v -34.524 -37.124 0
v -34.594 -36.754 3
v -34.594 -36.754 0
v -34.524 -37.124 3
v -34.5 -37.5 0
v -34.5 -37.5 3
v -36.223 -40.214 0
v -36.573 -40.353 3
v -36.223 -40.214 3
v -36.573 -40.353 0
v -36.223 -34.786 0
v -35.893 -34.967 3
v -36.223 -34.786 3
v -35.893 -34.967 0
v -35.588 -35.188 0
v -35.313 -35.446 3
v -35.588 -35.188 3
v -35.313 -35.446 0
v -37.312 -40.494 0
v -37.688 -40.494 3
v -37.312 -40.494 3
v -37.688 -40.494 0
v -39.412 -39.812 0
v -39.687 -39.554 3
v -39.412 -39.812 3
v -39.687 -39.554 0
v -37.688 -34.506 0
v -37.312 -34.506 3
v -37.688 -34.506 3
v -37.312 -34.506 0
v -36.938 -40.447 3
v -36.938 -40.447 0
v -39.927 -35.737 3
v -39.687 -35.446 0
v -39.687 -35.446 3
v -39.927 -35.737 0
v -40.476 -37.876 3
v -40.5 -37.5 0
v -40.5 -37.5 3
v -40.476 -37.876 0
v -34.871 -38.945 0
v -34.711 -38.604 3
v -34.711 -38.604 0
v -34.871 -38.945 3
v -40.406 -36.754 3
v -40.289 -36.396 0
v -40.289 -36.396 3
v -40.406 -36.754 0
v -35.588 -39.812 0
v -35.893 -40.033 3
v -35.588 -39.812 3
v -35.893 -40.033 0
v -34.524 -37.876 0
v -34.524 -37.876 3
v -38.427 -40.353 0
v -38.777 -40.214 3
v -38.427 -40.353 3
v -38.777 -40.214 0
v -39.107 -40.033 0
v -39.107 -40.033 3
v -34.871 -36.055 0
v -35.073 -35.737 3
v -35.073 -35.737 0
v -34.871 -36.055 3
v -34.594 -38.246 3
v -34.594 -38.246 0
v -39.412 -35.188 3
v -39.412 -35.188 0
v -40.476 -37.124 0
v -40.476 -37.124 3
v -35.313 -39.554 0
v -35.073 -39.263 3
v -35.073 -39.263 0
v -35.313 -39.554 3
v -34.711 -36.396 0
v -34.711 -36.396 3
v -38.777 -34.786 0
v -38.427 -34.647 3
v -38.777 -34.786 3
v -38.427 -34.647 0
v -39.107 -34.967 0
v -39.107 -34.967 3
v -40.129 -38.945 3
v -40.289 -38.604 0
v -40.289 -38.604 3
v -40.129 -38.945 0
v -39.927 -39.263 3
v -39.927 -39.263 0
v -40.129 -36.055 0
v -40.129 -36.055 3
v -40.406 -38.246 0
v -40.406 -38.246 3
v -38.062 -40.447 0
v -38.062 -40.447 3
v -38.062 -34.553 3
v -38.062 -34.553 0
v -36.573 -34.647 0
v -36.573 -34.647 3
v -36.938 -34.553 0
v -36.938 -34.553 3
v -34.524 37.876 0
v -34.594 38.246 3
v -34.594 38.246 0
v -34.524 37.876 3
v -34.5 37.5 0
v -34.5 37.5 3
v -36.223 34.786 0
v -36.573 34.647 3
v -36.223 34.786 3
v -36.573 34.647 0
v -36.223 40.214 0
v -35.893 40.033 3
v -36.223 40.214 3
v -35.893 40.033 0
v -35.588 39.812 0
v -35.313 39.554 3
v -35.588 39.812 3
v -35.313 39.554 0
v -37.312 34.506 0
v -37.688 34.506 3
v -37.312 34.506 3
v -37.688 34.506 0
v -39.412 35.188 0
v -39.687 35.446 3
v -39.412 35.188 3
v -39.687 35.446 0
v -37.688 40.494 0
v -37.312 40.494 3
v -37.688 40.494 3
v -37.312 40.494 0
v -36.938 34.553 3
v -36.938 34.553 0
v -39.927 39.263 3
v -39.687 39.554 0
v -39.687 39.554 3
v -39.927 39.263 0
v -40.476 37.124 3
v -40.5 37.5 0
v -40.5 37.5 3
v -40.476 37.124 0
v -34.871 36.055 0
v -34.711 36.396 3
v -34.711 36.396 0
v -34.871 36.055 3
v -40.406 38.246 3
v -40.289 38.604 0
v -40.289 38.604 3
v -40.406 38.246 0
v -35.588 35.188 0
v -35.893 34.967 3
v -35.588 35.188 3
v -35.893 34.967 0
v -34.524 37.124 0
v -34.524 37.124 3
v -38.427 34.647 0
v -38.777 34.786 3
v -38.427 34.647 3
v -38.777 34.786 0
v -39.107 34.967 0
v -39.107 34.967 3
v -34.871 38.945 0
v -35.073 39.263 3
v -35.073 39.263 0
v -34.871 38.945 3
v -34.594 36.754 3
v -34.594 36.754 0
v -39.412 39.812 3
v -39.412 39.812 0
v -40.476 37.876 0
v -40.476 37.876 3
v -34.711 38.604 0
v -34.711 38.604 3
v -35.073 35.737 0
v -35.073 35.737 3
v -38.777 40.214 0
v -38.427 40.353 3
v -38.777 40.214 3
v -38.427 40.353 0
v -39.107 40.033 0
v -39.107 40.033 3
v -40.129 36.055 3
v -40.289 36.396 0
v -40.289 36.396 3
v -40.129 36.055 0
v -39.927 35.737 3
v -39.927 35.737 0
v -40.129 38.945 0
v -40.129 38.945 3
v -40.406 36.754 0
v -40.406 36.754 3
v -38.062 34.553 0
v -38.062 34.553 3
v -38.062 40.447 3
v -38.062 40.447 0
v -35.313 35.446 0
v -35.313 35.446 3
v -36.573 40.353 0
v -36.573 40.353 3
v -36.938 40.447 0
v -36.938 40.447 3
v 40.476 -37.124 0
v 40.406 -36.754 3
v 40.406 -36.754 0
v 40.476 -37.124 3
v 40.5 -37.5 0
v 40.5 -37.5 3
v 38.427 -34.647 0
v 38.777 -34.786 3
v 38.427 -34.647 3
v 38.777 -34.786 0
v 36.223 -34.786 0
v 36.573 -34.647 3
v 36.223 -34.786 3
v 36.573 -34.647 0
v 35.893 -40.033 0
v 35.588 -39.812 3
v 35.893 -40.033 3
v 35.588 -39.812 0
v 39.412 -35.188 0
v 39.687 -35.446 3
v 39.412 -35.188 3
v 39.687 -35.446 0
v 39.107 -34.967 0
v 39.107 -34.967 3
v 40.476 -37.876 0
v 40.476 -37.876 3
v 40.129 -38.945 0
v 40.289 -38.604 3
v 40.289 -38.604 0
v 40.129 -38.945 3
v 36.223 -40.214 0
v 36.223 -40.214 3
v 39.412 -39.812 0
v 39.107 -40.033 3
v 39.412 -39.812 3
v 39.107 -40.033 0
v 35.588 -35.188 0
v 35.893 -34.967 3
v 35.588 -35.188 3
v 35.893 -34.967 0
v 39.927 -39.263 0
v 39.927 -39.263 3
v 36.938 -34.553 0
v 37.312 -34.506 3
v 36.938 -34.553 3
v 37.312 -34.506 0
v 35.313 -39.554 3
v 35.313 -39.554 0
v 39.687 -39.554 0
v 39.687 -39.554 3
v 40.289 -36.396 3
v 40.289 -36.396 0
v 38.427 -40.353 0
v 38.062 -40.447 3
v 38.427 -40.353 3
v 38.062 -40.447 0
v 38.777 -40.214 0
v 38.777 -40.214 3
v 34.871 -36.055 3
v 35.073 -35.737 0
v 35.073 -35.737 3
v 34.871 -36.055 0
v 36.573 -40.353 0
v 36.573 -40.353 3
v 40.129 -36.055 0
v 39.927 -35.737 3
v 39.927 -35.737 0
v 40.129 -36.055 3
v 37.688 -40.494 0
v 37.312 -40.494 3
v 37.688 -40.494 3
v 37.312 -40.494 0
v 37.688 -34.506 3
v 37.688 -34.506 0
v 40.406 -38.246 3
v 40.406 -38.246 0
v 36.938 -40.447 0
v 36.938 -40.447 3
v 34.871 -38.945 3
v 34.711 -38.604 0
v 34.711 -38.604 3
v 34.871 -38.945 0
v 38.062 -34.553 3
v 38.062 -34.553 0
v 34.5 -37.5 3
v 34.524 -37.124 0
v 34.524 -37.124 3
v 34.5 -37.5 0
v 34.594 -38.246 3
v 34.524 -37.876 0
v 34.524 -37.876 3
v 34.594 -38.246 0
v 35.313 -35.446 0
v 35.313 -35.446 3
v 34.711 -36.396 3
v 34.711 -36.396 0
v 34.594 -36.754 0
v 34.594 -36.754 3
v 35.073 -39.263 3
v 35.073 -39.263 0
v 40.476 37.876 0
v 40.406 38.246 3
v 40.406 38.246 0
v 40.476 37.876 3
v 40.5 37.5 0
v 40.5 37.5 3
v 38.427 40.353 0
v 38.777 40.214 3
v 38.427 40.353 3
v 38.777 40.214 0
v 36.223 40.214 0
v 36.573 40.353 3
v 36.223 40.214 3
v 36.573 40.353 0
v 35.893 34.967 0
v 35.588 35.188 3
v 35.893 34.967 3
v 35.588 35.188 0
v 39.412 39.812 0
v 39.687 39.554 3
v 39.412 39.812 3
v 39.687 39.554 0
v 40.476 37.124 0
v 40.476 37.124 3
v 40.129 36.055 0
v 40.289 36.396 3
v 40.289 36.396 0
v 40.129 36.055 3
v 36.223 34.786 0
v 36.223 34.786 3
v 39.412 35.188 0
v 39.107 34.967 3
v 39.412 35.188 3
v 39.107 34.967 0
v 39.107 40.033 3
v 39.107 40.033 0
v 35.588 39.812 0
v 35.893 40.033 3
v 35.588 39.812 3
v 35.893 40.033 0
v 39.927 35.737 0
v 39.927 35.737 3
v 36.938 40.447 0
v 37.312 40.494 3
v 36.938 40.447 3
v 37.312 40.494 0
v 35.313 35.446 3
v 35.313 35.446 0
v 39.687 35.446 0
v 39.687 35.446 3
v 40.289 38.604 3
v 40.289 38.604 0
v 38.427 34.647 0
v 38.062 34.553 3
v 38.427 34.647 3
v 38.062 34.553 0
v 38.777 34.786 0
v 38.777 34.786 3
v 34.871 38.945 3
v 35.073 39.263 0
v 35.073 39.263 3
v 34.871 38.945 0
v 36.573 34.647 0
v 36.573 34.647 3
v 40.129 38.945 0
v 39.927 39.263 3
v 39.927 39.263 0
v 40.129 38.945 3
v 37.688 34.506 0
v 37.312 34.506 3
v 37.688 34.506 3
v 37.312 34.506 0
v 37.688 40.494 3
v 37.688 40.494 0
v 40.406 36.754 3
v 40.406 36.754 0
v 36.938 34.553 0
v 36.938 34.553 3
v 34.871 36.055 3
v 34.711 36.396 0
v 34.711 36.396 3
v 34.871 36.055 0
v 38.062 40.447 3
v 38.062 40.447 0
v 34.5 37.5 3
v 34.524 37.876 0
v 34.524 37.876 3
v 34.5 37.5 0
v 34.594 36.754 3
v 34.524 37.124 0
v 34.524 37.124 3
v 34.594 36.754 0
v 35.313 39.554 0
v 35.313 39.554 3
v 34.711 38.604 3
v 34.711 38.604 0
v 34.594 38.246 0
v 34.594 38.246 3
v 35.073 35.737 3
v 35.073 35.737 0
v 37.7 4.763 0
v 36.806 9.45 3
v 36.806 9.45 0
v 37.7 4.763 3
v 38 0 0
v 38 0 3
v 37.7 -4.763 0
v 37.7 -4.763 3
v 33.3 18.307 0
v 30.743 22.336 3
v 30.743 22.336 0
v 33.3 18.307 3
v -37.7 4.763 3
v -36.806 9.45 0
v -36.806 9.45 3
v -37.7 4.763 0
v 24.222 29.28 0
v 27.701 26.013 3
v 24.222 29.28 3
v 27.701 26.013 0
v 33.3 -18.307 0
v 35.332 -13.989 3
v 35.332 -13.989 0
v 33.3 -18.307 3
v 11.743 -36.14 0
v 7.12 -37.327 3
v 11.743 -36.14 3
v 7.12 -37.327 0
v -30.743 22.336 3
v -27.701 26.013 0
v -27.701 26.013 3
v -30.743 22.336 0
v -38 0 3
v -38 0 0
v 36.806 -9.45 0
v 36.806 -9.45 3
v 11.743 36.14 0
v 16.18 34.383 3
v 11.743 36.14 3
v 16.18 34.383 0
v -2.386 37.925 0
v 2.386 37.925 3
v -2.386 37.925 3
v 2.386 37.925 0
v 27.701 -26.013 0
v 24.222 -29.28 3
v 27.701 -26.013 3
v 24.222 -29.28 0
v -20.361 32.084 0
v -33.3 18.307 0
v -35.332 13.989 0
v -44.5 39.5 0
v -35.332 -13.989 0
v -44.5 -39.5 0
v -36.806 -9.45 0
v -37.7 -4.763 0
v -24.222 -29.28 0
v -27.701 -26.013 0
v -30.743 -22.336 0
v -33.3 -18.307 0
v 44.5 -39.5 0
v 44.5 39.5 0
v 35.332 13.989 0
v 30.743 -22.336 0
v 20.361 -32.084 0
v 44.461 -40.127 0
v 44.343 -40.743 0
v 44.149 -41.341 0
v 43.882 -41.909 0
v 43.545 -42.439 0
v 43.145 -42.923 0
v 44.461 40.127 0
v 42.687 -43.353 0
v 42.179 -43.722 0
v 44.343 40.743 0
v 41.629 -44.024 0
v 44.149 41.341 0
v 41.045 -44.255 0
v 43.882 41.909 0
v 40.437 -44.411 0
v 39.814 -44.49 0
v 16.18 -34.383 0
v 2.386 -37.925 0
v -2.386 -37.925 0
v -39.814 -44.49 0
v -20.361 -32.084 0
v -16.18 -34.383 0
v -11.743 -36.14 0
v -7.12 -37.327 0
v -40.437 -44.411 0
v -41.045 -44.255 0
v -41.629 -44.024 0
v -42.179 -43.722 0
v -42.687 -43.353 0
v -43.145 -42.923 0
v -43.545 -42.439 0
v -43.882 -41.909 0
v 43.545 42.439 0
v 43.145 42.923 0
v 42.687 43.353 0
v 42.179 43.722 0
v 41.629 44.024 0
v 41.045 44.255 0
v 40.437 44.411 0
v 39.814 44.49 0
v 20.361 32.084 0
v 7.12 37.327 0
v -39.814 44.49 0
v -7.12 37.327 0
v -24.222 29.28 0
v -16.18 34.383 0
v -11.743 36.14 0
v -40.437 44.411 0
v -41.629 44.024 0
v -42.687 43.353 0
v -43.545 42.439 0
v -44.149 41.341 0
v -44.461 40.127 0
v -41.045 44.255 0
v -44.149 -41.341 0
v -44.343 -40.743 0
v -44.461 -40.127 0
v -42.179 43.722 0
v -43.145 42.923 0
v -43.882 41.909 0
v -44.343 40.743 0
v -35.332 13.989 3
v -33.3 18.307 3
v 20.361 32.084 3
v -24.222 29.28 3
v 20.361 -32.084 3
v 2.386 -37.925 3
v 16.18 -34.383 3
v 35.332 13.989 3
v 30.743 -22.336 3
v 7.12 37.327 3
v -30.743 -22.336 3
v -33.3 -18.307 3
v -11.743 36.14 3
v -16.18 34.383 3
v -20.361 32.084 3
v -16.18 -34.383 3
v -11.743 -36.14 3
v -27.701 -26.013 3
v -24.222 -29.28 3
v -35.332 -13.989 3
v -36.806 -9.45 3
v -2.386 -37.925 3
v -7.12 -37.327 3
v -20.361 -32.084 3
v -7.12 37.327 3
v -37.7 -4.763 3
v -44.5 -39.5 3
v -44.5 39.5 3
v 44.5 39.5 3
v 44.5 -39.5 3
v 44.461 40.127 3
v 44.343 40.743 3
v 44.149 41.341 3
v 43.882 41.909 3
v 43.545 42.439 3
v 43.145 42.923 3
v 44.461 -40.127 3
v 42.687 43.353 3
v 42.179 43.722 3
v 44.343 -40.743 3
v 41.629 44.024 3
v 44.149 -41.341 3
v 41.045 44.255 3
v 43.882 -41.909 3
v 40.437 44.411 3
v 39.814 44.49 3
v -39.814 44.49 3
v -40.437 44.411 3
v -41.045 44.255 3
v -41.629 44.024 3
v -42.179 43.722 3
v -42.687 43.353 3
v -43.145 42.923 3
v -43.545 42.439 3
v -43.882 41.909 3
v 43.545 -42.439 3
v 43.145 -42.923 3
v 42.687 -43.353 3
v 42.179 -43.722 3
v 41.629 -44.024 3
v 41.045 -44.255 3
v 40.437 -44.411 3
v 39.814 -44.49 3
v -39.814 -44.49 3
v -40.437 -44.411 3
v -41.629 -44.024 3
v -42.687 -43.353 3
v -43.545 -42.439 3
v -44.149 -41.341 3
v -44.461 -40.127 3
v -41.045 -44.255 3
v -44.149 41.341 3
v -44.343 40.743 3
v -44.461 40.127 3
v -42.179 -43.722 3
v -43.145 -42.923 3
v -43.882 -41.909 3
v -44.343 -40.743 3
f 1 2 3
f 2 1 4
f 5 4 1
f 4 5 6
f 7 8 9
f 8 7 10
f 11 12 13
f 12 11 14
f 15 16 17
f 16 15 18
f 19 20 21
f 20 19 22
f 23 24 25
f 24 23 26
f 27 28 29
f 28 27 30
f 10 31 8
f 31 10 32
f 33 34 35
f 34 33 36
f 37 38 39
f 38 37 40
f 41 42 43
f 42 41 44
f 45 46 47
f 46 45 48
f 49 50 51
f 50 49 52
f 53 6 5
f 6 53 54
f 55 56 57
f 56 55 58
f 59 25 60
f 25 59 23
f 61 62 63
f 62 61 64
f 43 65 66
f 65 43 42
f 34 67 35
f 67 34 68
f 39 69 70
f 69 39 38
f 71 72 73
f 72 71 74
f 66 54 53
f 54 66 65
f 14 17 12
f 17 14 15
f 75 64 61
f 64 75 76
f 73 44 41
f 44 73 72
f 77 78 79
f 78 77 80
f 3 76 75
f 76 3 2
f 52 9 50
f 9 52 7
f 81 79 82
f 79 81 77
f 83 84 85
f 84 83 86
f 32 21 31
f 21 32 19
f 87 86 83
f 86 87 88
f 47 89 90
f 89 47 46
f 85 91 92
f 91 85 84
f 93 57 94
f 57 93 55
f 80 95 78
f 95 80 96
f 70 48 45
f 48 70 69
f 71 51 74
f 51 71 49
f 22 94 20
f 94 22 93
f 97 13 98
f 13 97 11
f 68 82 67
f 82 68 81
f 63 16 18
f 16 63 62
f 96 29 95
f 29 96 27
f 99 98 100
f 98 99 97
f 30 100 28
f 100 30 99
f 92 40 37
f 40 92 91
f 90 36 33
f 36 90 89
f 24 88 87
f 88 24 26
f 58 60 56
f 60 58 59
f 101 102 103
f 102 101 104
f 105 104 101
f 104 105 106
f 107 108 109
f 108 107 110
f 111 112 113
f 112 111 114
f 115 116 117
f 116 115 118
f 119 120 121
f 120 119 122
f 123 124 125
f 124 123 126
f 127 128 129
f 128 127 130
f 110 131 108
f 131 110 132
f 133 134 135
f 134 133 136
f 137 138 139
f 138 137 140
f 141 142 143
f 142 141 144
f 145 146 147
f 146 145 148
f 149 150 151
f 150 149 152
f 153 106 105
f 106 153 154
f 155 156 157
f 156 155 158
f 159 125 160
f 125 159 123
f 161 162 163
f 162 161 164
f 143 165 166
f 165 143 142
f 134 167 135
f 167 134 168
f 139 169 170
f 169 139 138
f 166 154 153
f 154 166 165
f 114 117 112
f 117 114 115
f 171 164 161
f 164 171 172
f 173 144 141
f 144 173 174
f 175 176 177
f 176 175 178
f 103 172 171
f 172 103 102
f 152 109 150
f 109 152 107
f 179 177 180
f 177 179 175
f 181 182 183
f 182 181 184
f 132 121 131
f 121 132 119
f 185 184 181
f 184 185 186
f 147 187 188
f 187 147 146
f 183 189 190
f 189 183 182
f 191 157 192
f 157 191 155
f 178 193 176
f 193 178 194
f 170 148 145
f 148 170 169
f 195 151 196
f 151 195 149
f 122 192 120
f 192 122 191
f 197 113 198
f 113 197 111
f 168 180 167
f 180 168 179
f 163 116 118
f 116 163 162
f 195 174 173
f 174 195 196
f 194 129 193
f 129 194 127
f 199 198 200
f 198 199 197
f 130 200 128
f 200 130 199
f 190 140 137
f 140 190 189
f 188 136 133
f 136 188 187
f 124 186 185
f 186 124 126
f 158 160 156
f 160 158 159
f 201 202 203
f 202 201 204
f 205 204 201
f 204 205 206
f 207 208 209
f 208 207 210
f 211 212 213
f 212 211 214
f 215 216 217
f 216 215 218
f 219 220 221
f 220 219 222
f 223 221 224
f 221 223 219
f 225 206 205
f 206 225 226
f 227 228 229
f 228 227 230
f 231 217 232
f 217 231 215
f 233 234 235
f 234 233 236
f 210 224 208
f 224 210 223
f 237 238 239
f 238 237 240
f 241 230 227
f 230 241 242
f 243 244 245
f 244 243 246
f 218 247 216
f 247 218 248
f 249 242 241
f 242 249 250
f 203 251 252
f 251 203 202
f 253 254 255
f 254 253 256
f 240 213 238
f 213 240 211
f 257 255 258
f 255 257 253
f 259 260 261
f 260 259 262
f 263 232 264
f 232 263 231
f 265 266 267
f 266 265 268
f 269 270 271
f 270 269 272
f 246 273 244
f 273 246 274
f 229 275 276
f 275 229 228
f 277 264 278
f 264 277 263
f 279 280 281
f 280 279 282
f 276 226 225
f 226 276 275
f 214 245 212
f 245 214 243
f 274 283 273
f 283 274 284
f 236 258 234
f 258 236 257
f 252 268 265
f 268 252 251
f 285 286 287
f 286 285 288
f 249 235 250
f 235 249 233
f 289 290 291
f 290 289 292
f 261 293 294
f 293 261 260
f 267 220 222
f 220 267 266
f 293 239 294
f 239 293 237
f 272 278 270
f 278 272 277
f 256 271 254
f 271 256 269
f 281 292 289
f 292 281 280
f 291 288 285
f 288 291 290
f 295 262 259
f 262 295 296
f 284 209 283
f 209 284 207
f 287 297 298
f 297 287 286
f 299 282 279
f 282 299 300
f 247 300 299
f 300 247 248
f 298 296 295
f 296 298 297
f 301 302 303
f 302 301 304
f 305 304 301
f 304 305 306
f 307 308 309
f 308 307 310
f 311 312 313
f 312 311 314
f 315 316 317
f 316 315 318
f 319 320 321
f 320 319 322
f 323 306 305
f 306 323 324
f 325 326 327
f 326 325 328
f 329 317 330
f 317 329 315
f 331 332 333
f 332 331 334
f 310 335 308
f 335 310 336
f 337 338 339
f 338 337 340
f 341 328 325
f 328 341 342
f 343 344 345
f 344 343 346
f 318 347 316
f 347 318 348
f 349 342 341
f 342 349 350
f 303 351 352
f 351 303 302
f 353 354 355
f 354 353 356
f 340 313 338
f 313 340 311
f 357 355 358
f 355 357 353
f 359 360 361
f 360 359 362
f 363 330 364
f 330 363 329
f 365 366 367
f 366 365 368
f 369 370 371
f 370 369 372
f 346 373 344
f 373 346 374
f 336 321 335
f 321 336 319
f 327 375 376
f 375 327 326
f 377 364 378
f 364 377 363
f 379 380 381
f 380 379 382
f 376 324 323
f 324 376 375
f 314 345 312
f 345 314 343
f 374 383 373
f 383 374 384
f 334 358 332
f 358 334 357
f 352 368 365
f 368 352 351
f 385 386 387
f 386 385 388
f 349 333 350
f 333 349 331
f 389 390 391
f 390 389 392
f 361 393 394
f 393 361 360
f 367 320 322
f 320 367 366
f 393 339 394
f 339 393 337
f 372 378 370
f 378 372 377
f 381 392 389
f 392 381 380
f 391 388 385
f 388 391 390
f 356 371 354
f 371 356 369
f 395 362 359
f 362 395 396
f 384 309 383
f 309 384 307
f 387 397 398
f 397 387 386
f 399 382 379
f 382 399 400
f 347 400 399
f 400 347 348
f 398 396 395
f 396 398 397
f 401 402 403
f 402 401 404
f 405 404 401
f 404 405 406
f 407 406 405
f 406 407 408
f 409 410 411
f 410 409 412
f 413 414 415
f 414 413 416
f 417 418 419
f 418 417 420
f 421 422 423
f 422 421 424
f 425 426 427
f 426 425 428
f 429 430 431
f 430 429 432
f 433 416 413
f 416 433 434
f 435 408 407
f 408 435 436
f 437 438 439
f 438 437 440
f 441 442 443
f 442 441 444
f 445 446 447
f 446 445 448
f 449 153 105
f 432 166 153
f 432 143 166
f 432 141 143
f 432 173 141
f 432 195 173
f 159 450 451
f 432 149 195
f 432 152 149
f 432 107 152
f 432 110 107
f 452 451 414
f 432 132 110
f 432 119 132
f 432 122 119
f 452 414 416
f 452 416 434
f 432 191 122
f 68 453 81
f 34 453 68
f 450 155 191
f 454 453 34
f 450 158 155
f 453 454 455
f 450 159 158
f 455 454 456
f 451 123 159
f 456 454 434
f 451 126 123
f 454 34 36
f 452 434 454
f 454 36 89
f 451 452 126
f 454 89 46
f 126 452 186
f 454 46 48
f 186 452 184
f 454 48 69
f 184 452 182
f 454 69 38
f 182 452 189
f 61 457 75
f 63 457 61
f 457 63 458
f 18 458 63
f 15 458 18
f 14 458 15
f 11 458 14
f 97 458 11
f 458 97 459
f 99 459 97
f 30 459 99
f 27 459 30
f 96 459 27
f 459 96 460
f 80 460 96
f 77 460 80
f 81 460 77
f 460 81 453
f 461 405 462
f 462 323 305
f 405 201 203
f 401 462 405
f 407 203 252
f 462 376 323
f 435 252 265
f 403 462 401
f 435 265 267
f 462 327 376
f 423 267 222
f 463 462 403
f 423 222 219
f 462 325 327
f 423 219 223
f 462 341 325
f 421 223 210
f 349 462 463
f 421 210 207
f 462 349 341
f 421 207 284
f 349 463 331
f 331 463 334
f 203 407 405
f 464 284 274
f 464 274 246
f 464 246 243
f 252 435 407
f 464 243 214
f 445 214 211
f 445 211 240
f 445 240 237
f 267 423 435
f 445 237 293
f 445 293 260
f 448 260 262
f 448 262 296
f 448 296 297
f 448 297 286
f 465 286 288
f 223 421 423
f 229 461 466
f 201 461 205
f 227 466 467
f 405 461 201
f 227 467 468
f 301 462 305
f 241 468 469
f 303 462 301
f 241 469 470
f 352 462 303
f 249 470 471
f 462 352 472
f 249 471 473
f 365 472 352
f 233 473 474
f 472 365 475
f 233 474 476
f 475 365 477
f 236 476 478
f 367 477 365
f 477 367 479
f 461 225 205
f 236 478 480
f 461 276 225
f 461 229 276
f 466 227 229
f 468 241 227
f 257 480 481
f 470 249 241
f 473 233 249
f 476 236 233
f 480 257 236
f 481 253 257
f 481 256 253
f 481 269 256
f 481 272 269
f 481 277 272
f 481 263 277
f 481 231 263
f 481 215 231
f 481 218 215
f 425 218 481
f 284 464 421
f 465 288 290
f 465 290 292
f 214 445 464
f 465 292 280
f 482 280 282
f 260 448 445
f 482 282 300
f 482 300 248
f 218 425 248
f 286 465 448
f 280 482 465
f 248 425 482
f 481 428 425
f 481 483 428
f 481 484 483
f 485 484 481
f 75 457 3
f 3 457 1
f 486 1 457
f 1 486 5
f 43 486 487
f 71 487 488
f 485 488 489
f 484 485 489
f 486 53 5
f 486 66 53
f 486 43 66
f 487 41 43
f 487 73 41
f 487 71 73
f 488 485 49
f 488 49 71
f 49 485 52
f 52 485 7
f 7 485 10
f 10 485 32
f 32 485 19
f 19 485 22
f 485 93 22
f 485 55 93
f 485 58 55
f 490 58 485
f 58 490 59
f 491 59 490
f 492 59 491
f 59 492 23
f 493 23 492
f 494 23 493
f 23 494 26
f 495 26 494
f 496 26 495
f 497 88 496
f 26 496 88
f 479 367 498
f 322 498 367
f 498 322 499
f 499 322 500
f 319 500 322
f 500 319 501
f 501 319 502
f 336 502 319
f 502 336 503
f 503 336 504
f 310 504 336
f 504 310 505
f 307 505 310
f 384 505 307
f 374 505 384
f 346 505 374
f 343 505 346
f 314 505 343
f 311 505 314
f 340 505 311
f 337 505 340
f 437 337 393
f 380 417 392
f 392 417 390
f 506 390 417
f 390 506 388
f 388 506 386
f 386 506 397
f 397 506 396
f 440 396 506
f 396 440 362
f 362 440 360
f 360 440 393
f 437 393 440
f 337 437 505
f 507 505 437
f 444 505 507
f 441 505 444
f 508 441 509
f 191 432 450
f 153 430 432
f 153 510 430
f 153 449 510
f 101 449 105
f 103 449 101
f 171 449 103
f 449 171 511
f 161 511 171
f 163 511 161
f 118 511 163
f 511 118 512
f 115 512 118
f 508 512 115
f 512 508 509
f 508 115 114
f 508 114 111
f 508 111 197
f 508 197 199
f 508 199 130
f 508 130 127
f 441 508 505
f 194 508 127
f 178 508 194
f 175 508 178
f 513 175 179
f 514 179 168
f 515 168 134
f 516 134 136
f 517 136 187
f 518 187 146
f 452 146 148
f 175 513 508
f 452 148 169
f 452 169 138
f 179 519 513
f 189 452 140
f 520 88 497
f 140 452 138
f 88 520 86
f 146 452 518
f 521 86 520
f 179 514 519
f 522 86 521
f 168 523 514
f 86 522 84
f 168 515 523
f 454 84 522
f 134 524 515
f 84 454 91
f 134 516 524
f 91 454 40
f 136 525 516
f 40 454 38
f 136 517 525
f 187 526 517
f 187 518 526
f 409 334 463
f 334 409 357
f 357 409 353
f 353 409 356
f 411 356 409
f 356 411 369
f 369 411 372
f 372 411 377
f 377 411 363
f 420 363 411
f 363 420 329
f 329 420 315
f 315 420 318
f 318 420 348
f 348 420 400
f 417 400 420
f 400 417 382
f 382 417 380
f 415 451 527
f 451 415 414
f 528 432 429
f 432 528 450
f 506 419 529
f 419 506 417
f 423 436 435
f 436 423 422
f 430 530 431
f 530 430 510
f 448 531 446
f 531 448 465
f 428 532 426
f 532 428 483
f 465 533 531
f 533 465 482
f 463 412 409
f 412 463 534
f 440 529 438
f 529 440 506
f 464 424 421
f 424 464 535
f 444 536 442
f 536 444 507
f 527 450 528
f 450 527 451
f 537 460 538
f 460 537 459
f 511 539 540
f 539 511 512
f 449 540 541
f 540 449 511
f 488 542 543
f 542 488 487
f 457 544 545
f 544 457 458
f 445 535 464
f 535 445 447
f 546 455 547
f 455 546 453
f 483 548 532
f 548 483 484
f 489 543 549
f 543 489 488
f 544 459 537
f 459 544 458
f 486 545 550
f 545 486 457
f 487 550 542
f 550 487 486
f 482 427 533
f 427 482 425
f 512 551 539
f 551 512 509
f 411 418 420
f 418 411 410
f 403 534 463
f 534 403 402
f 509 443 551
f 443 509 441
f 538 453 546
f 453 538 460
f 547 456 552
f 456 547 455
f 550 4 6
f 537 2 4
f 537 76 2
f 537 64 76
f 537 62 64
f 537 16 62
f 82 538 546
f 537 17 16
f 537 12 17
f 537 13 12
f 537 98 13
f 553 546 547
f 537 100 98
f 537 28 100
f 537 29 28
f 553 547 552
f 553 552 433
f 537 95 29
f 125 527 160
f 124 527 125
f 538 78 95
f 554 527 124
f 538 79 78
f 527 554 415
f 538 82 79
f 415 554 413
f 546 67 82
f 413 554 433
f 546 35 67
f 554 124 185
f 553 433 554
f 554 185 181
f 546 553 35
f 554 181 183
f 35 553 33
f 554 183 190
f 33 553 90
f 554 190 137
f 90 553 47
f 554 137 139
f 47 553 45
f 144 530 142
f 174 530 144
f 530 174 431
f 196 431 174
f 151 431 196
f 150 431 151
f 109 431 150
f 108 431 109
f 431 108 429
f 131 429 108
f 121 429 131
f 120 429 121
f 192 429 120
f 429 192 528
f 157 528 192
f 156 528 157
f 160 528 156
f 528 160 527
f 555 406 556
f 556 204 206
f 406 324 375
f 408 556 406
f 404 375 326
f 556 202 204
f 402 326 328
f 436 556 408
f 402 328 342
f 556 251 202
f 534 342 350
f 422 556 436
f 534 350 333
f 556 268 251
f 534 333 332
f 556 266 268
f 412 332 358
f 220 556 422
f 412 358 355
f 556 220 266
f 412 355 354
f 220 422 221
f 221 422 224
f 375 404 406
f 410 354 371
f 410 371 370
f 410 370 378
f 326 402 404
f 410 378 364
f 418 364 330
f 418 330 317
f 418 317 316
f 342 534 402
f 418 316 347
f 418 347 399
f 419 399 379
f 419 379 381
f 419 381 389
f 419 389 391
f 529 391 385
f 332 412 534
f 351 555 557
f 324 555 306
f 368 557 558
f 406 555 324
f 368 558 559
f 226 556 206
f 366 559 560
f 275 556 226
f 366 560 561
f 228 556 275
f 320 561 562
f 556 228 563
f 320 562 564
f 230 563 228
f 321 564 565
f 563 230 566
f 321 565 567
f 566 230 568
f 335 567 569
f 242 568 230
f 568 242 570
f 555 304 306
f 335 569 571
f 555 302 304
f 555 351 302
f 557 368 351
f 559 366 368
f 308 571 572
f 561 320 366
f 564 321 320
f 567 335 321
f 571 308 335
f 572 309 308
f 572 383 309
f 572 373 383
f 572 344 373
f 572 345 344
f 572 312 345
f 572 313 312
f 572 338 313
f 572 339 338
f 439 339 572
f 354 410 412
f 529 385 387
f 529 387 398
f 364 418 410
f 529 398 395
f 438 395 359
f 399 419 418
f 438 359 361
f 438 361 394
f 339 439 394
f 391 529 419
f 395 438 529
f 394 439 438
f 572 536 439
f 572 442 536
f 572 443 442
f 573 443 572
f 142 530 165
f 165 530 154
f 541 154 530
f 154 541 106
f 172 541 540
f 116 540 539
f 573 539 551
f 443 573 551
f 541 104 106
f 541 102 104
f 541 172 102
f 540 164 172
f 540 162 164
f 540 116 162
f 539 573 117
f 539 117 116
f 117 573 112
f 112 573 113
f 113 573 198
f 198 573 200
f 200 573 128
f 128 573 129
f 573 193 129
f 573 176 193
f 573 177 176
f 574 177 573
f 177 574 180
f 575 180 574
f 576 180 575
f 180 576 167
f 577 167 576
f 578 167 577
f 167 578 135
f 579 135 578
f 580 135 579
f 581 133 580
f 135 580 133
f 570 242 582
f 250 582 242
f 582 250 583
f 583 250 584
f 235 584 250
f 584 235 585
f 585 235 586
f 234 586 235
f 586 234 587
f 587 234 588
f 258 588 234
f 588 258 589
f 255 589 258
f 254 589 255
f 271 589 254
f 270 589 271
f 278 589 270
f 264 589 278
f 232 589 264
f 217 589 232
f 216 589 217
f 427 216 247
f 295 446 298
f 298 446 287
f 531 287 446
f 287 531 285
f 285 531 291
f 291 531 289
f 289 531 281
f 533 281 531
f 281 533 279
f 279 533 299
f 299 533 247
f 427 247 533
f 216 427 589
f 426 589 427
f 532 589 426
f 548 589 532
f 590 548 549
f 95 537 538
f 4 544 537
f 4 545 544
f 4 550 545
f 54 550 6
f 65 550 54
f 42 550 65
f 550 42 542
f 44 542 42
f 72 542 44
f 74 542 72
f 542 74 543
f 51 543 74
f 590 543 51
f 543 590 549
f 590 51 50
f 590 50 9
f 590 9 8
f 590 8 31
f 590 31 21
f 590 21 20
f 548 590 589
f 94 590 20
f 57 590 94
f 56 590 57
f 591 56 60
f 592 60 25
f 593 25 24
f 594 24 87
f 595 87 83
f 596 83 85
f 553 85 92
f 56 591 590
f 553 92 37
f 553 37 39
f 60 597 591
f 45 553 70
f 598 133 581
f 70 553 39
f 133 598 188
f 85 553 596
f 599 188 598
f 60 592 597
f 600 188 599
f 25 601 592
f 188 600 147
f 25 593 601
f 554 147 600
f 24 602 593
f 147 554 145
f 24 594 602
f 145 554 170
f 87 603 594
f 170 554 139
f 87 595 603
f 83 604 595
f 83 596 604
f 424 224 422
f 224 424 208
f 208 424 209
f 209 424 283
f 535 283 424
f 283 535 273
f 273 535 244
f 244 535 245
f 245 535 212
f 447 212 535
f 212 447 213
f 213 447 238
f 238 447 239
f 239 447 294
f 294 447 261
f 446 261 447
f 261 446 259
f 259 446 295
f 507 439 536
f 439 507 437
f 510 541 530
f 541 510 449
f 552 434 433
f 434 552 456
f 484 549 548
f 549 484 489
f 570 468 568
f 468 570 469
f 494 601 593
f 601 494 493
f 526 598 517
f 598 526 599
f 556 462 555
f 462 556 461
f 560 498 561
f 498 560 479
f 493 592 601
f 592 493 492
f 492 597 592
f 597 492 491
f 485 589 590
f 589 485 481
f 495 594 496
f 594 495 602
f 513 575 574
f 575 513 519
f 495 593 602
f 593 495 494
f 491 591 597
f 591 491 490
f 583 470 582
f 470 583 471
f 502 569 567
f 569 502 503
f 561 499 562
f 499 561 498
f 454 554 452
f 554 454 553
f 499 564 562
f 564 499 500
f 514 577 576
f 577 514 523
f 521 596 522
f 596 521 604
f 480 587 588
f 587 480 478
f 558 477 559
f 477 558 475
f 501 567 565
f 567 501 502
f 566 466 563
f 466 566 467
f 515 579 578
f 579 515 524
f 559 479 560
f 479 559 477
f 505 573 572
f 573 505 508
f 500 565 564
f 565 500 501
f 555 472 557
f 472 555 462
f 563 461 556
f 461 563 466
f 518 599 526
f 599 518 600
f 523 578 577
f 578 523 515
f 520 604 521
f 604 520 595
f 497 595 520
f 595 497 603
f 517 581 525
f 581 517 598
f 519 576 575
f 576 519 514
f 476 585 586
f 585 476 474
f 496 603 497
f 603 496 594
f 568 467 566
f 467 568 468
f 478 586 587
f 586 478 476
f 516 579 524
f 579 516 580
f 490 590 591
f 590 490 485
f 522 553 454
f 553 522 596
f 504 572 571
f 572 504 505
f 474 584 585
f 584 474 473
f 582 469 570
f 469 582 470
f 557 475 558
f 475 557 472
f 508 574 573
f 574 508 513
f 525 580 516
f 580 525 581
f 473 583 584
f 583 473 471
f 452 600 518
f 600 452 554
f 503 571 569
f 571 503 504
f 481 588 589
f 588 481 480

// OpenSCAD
$fn = 50;


difference() {
	union() {
		hull() {
			translate(v = [-39.5000000000, 39.5000000000, 0]) {
				cylinder(h = 3, r = 5);
			}
			translate(v = [39.5000000000, 39.5000000000, 0]) {
				cylinder(h = 3, r = 5);
			}
			translate(v = [-39.5000000000, -39.5000000000, 0]) {
				cylinder(h = 3, r = 5);
			}
			translate(v = [39.5000000000, -39.5000000000, 0]) {
				cylinder(h = 3, r = 5);
			}
		}
	}
	union() {
		#translate(v = [-37.5000000000, -37.5000000000, -100.0000000000]) {
			cylinder(h = 200, r = 3.0000000000);
		}
		#translate(v = [-37.5000000000, 37.5000000000, -100.0000000000]) {
			cylinder(h = 200, r = 3.0000000000);
		}
		#translate(v = [37.5000000000, -37.5000000000, -100.0000000000]) {
			cylinder(h = 200, r = 3.0000000000);
		}
		#translate(v = [37.5000000000, 37.5000000000, -100.0000000000]) {
			cylinder(h = 200, r = 3.0000000000);
		}
		#cylinder(h = 3, r = 38.0000000000);
	}
}
